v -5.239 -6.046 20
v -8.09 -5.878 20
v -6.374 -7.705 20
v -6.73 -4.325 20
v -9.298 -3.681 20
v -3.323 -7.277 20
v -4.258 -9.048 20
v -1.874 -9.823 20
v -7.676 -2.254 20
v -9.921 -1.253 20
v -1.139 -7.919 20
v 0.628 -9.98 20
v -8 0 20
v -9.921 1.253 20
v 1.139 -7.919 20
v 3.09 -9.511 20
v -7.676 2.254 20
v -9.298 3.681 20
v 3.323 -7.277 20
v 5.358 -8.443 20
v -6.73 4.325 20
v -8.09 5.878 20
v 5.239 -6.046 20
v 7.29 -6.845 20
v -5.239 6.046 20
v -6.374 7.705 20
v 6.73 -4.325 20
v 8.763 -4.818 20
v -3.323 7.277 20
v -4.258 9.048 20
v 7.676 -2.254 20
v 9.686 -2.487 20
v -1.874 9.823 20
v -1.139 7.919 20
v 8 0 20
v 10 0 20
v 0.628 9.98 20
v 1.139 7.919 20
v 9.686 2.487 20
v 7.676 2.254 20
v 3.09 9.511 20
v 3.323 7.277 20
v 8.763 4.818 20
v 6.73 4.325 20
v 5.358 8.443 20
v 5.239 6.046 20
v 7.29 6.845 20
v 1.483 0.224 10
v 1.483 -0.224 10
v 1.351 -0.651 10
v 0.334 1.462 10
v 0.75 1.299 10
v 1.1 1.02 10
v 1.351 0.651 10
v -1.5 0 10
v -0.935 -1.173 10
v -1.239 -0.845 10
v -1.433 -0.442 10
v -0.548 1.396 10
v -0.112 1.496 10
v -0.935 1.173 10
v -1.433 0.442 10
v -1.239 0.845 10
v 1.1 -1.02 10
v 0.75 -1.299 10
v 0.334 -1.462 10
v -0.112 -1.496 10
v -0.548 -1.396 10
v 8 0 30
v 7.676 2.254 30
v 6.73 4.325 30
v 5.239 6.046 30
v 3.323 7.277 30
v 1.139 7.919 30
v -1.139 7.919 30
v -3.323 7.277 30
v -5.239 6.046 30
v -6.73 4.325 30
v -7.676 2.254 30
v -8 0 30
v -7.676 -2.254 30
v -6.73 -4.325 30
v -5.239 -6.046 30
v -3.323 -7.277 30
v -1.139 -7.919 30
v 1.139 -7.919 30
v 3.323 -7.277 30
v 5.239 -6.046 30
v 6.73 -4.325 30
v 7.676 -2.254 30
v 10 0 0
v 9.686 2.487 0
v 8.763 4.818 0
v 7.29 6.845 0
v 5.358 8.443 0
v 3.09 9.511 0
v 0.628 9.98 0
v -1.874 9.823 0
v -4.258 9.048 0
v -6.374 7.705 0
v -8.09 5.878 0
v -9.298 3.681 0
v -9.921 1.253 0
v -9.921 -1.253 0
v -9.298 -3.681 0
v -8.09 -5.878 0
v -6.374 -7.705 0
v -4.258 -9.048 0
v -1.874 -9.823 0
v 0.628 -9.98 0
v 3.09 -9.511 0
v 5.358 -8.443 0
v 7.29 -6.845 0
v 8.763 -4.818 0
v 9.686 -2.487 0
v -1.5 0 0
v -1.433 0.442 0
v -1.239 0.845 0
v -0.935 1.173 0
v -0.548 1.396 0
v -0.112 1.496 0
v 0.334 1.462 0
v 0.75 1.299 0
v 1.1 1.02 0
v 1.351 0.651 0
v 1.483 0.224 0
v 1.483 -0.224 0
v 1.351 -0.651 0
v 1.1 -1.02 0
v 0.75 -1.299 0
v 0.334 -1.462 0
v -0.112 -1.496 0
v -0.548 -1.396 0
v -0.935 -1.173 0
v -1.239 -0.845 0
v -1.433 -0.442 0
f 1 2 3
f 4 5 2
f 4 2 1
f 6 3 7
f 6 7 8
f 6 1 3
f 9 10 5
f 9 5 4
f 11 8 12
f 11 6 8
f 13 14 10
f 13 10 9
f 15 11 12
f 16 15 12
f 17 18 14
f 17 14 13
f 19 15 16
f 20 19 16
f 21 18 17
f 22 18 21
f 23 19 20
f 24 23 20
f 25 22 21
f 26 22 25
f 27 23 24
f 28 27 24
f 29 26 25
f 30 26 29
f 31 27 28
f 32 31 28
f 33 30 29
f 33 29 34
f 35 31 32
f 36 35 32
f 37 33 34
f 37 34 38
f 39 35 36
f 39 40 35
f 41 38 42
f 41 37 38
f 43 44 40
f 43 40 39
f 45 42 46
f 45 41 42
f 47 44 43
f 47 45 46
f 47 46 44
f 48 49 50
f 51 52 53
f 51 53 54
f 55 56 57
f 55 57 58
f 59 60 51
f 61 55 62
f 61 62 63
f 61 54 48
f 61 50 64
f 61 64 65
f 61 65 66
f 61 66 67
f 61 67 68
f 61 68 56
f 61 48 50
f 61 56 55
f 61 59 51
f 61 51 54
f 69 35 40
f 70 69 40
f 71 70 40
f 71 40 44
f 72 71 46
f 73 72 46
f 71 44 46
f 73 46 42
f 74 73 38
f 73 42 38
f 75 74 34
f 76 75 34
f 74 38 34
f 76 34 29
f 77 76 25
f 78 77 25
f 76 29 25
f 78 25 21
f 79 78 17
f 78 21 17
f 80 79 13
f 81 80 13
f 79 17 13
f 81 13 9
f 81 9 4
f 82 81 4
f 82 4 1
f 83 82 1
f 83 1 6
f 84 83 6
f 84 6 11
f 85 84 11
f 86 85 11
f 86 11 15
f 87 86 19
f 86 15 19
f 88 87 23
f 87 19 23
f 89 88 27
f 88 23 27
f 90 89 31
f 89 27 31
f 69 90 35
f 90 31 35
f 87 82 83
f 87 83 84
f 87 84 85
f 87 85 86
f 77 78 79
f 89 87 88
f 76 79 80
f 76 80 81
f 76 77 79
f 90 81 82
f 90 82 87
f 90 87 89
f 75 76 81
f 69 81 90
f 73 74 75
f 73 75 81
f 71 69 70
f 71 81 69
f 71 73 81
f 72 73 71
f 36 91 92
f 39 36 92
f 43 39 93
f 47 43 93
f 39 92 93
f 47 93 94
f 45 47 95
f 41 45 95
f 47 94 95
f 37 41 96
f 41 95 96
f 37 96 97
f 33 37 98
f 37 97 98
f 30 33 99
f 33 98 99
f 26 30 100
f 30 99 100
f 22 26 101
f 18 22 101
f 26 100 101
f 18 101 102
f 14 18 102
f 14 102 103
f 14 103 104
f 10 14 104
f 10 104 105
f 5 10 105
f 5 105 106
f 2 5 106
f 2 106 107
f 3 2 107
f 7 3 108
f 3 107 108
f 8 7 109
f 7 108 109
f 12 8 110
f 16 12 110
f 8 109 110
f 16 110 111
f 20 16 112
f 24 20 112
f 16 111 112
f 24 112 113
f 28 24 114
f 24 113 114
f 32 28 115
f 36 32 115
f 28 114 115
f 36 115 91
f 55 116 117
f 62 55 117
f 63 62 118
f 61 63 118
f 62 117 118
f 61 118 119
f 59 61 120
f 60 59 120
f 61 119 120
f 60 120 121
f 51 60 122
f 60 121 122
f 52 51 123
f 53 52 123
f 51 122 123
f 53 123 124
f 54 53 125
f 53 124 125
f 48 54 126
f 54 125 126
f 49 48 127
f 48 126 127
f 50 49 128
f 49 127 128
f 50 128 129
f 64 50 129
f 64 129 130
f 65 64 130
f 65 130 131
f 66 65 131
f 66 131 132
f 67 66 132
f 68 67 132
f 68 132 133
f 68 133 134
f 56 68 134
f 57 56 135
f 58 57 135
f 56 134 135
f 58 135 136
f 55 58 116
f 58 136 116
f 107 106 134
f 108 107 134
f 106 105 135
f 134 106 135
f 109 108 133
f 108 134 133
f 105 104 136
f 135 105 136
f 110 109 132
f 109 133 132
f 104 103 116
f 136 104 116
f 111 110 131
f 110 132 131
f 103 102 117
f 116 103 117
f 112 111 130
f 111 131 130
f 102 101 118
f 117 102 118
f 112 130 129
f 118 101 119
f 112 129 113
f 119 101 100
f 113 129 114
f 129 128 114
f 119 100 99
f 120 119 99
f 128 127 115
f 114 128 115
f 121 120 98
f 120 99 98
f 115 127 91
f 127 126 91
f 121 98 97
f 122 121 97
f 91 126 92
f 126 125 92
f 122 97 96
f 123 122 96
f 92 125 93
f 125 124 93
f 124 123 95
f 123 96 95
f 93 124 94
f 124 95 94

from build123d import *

# Parameters (mm, degrees)
SKETCH_1_R          = 10
EXTRUDE_1_DEPTH     = 20
SKETCH_2_R          = 1.5
CUT_EXTRUDE_1_DEPTH = 10
SKETCH_3_R          = 8
EXTRUDE_2_DEPTH     = 10


with BuildPart() as part:
    # 스케치1 → 보스-돌출1 (new body)
    with BuildSketch(Plane.XY):
        Circle(SKETCH_1_R)
    extrude(amount=EXTRUDE_1_DEPTH)

    # 스케치2 → 컷-돌출1 (cut)
    with BuildSketch(Plane(origin=(0, 0, 0), x_dir=(-1, 0, 0), z_dir=(0, 0, -1))):
        Circle(SKETCH_2_R)
    extrude(amount=-CUT_EXTRUDE_1_DEPTH, mode=Mode.SUBTRACT)

    # 스케치3 → 보스-돌출2 (add)
    with BuildSketch(Plane.XY.offset(20)):
        Circle(SKETCH_3_R)
    extrude(amount=EXTRUDE_2_DEPTH)


solid = part.part
